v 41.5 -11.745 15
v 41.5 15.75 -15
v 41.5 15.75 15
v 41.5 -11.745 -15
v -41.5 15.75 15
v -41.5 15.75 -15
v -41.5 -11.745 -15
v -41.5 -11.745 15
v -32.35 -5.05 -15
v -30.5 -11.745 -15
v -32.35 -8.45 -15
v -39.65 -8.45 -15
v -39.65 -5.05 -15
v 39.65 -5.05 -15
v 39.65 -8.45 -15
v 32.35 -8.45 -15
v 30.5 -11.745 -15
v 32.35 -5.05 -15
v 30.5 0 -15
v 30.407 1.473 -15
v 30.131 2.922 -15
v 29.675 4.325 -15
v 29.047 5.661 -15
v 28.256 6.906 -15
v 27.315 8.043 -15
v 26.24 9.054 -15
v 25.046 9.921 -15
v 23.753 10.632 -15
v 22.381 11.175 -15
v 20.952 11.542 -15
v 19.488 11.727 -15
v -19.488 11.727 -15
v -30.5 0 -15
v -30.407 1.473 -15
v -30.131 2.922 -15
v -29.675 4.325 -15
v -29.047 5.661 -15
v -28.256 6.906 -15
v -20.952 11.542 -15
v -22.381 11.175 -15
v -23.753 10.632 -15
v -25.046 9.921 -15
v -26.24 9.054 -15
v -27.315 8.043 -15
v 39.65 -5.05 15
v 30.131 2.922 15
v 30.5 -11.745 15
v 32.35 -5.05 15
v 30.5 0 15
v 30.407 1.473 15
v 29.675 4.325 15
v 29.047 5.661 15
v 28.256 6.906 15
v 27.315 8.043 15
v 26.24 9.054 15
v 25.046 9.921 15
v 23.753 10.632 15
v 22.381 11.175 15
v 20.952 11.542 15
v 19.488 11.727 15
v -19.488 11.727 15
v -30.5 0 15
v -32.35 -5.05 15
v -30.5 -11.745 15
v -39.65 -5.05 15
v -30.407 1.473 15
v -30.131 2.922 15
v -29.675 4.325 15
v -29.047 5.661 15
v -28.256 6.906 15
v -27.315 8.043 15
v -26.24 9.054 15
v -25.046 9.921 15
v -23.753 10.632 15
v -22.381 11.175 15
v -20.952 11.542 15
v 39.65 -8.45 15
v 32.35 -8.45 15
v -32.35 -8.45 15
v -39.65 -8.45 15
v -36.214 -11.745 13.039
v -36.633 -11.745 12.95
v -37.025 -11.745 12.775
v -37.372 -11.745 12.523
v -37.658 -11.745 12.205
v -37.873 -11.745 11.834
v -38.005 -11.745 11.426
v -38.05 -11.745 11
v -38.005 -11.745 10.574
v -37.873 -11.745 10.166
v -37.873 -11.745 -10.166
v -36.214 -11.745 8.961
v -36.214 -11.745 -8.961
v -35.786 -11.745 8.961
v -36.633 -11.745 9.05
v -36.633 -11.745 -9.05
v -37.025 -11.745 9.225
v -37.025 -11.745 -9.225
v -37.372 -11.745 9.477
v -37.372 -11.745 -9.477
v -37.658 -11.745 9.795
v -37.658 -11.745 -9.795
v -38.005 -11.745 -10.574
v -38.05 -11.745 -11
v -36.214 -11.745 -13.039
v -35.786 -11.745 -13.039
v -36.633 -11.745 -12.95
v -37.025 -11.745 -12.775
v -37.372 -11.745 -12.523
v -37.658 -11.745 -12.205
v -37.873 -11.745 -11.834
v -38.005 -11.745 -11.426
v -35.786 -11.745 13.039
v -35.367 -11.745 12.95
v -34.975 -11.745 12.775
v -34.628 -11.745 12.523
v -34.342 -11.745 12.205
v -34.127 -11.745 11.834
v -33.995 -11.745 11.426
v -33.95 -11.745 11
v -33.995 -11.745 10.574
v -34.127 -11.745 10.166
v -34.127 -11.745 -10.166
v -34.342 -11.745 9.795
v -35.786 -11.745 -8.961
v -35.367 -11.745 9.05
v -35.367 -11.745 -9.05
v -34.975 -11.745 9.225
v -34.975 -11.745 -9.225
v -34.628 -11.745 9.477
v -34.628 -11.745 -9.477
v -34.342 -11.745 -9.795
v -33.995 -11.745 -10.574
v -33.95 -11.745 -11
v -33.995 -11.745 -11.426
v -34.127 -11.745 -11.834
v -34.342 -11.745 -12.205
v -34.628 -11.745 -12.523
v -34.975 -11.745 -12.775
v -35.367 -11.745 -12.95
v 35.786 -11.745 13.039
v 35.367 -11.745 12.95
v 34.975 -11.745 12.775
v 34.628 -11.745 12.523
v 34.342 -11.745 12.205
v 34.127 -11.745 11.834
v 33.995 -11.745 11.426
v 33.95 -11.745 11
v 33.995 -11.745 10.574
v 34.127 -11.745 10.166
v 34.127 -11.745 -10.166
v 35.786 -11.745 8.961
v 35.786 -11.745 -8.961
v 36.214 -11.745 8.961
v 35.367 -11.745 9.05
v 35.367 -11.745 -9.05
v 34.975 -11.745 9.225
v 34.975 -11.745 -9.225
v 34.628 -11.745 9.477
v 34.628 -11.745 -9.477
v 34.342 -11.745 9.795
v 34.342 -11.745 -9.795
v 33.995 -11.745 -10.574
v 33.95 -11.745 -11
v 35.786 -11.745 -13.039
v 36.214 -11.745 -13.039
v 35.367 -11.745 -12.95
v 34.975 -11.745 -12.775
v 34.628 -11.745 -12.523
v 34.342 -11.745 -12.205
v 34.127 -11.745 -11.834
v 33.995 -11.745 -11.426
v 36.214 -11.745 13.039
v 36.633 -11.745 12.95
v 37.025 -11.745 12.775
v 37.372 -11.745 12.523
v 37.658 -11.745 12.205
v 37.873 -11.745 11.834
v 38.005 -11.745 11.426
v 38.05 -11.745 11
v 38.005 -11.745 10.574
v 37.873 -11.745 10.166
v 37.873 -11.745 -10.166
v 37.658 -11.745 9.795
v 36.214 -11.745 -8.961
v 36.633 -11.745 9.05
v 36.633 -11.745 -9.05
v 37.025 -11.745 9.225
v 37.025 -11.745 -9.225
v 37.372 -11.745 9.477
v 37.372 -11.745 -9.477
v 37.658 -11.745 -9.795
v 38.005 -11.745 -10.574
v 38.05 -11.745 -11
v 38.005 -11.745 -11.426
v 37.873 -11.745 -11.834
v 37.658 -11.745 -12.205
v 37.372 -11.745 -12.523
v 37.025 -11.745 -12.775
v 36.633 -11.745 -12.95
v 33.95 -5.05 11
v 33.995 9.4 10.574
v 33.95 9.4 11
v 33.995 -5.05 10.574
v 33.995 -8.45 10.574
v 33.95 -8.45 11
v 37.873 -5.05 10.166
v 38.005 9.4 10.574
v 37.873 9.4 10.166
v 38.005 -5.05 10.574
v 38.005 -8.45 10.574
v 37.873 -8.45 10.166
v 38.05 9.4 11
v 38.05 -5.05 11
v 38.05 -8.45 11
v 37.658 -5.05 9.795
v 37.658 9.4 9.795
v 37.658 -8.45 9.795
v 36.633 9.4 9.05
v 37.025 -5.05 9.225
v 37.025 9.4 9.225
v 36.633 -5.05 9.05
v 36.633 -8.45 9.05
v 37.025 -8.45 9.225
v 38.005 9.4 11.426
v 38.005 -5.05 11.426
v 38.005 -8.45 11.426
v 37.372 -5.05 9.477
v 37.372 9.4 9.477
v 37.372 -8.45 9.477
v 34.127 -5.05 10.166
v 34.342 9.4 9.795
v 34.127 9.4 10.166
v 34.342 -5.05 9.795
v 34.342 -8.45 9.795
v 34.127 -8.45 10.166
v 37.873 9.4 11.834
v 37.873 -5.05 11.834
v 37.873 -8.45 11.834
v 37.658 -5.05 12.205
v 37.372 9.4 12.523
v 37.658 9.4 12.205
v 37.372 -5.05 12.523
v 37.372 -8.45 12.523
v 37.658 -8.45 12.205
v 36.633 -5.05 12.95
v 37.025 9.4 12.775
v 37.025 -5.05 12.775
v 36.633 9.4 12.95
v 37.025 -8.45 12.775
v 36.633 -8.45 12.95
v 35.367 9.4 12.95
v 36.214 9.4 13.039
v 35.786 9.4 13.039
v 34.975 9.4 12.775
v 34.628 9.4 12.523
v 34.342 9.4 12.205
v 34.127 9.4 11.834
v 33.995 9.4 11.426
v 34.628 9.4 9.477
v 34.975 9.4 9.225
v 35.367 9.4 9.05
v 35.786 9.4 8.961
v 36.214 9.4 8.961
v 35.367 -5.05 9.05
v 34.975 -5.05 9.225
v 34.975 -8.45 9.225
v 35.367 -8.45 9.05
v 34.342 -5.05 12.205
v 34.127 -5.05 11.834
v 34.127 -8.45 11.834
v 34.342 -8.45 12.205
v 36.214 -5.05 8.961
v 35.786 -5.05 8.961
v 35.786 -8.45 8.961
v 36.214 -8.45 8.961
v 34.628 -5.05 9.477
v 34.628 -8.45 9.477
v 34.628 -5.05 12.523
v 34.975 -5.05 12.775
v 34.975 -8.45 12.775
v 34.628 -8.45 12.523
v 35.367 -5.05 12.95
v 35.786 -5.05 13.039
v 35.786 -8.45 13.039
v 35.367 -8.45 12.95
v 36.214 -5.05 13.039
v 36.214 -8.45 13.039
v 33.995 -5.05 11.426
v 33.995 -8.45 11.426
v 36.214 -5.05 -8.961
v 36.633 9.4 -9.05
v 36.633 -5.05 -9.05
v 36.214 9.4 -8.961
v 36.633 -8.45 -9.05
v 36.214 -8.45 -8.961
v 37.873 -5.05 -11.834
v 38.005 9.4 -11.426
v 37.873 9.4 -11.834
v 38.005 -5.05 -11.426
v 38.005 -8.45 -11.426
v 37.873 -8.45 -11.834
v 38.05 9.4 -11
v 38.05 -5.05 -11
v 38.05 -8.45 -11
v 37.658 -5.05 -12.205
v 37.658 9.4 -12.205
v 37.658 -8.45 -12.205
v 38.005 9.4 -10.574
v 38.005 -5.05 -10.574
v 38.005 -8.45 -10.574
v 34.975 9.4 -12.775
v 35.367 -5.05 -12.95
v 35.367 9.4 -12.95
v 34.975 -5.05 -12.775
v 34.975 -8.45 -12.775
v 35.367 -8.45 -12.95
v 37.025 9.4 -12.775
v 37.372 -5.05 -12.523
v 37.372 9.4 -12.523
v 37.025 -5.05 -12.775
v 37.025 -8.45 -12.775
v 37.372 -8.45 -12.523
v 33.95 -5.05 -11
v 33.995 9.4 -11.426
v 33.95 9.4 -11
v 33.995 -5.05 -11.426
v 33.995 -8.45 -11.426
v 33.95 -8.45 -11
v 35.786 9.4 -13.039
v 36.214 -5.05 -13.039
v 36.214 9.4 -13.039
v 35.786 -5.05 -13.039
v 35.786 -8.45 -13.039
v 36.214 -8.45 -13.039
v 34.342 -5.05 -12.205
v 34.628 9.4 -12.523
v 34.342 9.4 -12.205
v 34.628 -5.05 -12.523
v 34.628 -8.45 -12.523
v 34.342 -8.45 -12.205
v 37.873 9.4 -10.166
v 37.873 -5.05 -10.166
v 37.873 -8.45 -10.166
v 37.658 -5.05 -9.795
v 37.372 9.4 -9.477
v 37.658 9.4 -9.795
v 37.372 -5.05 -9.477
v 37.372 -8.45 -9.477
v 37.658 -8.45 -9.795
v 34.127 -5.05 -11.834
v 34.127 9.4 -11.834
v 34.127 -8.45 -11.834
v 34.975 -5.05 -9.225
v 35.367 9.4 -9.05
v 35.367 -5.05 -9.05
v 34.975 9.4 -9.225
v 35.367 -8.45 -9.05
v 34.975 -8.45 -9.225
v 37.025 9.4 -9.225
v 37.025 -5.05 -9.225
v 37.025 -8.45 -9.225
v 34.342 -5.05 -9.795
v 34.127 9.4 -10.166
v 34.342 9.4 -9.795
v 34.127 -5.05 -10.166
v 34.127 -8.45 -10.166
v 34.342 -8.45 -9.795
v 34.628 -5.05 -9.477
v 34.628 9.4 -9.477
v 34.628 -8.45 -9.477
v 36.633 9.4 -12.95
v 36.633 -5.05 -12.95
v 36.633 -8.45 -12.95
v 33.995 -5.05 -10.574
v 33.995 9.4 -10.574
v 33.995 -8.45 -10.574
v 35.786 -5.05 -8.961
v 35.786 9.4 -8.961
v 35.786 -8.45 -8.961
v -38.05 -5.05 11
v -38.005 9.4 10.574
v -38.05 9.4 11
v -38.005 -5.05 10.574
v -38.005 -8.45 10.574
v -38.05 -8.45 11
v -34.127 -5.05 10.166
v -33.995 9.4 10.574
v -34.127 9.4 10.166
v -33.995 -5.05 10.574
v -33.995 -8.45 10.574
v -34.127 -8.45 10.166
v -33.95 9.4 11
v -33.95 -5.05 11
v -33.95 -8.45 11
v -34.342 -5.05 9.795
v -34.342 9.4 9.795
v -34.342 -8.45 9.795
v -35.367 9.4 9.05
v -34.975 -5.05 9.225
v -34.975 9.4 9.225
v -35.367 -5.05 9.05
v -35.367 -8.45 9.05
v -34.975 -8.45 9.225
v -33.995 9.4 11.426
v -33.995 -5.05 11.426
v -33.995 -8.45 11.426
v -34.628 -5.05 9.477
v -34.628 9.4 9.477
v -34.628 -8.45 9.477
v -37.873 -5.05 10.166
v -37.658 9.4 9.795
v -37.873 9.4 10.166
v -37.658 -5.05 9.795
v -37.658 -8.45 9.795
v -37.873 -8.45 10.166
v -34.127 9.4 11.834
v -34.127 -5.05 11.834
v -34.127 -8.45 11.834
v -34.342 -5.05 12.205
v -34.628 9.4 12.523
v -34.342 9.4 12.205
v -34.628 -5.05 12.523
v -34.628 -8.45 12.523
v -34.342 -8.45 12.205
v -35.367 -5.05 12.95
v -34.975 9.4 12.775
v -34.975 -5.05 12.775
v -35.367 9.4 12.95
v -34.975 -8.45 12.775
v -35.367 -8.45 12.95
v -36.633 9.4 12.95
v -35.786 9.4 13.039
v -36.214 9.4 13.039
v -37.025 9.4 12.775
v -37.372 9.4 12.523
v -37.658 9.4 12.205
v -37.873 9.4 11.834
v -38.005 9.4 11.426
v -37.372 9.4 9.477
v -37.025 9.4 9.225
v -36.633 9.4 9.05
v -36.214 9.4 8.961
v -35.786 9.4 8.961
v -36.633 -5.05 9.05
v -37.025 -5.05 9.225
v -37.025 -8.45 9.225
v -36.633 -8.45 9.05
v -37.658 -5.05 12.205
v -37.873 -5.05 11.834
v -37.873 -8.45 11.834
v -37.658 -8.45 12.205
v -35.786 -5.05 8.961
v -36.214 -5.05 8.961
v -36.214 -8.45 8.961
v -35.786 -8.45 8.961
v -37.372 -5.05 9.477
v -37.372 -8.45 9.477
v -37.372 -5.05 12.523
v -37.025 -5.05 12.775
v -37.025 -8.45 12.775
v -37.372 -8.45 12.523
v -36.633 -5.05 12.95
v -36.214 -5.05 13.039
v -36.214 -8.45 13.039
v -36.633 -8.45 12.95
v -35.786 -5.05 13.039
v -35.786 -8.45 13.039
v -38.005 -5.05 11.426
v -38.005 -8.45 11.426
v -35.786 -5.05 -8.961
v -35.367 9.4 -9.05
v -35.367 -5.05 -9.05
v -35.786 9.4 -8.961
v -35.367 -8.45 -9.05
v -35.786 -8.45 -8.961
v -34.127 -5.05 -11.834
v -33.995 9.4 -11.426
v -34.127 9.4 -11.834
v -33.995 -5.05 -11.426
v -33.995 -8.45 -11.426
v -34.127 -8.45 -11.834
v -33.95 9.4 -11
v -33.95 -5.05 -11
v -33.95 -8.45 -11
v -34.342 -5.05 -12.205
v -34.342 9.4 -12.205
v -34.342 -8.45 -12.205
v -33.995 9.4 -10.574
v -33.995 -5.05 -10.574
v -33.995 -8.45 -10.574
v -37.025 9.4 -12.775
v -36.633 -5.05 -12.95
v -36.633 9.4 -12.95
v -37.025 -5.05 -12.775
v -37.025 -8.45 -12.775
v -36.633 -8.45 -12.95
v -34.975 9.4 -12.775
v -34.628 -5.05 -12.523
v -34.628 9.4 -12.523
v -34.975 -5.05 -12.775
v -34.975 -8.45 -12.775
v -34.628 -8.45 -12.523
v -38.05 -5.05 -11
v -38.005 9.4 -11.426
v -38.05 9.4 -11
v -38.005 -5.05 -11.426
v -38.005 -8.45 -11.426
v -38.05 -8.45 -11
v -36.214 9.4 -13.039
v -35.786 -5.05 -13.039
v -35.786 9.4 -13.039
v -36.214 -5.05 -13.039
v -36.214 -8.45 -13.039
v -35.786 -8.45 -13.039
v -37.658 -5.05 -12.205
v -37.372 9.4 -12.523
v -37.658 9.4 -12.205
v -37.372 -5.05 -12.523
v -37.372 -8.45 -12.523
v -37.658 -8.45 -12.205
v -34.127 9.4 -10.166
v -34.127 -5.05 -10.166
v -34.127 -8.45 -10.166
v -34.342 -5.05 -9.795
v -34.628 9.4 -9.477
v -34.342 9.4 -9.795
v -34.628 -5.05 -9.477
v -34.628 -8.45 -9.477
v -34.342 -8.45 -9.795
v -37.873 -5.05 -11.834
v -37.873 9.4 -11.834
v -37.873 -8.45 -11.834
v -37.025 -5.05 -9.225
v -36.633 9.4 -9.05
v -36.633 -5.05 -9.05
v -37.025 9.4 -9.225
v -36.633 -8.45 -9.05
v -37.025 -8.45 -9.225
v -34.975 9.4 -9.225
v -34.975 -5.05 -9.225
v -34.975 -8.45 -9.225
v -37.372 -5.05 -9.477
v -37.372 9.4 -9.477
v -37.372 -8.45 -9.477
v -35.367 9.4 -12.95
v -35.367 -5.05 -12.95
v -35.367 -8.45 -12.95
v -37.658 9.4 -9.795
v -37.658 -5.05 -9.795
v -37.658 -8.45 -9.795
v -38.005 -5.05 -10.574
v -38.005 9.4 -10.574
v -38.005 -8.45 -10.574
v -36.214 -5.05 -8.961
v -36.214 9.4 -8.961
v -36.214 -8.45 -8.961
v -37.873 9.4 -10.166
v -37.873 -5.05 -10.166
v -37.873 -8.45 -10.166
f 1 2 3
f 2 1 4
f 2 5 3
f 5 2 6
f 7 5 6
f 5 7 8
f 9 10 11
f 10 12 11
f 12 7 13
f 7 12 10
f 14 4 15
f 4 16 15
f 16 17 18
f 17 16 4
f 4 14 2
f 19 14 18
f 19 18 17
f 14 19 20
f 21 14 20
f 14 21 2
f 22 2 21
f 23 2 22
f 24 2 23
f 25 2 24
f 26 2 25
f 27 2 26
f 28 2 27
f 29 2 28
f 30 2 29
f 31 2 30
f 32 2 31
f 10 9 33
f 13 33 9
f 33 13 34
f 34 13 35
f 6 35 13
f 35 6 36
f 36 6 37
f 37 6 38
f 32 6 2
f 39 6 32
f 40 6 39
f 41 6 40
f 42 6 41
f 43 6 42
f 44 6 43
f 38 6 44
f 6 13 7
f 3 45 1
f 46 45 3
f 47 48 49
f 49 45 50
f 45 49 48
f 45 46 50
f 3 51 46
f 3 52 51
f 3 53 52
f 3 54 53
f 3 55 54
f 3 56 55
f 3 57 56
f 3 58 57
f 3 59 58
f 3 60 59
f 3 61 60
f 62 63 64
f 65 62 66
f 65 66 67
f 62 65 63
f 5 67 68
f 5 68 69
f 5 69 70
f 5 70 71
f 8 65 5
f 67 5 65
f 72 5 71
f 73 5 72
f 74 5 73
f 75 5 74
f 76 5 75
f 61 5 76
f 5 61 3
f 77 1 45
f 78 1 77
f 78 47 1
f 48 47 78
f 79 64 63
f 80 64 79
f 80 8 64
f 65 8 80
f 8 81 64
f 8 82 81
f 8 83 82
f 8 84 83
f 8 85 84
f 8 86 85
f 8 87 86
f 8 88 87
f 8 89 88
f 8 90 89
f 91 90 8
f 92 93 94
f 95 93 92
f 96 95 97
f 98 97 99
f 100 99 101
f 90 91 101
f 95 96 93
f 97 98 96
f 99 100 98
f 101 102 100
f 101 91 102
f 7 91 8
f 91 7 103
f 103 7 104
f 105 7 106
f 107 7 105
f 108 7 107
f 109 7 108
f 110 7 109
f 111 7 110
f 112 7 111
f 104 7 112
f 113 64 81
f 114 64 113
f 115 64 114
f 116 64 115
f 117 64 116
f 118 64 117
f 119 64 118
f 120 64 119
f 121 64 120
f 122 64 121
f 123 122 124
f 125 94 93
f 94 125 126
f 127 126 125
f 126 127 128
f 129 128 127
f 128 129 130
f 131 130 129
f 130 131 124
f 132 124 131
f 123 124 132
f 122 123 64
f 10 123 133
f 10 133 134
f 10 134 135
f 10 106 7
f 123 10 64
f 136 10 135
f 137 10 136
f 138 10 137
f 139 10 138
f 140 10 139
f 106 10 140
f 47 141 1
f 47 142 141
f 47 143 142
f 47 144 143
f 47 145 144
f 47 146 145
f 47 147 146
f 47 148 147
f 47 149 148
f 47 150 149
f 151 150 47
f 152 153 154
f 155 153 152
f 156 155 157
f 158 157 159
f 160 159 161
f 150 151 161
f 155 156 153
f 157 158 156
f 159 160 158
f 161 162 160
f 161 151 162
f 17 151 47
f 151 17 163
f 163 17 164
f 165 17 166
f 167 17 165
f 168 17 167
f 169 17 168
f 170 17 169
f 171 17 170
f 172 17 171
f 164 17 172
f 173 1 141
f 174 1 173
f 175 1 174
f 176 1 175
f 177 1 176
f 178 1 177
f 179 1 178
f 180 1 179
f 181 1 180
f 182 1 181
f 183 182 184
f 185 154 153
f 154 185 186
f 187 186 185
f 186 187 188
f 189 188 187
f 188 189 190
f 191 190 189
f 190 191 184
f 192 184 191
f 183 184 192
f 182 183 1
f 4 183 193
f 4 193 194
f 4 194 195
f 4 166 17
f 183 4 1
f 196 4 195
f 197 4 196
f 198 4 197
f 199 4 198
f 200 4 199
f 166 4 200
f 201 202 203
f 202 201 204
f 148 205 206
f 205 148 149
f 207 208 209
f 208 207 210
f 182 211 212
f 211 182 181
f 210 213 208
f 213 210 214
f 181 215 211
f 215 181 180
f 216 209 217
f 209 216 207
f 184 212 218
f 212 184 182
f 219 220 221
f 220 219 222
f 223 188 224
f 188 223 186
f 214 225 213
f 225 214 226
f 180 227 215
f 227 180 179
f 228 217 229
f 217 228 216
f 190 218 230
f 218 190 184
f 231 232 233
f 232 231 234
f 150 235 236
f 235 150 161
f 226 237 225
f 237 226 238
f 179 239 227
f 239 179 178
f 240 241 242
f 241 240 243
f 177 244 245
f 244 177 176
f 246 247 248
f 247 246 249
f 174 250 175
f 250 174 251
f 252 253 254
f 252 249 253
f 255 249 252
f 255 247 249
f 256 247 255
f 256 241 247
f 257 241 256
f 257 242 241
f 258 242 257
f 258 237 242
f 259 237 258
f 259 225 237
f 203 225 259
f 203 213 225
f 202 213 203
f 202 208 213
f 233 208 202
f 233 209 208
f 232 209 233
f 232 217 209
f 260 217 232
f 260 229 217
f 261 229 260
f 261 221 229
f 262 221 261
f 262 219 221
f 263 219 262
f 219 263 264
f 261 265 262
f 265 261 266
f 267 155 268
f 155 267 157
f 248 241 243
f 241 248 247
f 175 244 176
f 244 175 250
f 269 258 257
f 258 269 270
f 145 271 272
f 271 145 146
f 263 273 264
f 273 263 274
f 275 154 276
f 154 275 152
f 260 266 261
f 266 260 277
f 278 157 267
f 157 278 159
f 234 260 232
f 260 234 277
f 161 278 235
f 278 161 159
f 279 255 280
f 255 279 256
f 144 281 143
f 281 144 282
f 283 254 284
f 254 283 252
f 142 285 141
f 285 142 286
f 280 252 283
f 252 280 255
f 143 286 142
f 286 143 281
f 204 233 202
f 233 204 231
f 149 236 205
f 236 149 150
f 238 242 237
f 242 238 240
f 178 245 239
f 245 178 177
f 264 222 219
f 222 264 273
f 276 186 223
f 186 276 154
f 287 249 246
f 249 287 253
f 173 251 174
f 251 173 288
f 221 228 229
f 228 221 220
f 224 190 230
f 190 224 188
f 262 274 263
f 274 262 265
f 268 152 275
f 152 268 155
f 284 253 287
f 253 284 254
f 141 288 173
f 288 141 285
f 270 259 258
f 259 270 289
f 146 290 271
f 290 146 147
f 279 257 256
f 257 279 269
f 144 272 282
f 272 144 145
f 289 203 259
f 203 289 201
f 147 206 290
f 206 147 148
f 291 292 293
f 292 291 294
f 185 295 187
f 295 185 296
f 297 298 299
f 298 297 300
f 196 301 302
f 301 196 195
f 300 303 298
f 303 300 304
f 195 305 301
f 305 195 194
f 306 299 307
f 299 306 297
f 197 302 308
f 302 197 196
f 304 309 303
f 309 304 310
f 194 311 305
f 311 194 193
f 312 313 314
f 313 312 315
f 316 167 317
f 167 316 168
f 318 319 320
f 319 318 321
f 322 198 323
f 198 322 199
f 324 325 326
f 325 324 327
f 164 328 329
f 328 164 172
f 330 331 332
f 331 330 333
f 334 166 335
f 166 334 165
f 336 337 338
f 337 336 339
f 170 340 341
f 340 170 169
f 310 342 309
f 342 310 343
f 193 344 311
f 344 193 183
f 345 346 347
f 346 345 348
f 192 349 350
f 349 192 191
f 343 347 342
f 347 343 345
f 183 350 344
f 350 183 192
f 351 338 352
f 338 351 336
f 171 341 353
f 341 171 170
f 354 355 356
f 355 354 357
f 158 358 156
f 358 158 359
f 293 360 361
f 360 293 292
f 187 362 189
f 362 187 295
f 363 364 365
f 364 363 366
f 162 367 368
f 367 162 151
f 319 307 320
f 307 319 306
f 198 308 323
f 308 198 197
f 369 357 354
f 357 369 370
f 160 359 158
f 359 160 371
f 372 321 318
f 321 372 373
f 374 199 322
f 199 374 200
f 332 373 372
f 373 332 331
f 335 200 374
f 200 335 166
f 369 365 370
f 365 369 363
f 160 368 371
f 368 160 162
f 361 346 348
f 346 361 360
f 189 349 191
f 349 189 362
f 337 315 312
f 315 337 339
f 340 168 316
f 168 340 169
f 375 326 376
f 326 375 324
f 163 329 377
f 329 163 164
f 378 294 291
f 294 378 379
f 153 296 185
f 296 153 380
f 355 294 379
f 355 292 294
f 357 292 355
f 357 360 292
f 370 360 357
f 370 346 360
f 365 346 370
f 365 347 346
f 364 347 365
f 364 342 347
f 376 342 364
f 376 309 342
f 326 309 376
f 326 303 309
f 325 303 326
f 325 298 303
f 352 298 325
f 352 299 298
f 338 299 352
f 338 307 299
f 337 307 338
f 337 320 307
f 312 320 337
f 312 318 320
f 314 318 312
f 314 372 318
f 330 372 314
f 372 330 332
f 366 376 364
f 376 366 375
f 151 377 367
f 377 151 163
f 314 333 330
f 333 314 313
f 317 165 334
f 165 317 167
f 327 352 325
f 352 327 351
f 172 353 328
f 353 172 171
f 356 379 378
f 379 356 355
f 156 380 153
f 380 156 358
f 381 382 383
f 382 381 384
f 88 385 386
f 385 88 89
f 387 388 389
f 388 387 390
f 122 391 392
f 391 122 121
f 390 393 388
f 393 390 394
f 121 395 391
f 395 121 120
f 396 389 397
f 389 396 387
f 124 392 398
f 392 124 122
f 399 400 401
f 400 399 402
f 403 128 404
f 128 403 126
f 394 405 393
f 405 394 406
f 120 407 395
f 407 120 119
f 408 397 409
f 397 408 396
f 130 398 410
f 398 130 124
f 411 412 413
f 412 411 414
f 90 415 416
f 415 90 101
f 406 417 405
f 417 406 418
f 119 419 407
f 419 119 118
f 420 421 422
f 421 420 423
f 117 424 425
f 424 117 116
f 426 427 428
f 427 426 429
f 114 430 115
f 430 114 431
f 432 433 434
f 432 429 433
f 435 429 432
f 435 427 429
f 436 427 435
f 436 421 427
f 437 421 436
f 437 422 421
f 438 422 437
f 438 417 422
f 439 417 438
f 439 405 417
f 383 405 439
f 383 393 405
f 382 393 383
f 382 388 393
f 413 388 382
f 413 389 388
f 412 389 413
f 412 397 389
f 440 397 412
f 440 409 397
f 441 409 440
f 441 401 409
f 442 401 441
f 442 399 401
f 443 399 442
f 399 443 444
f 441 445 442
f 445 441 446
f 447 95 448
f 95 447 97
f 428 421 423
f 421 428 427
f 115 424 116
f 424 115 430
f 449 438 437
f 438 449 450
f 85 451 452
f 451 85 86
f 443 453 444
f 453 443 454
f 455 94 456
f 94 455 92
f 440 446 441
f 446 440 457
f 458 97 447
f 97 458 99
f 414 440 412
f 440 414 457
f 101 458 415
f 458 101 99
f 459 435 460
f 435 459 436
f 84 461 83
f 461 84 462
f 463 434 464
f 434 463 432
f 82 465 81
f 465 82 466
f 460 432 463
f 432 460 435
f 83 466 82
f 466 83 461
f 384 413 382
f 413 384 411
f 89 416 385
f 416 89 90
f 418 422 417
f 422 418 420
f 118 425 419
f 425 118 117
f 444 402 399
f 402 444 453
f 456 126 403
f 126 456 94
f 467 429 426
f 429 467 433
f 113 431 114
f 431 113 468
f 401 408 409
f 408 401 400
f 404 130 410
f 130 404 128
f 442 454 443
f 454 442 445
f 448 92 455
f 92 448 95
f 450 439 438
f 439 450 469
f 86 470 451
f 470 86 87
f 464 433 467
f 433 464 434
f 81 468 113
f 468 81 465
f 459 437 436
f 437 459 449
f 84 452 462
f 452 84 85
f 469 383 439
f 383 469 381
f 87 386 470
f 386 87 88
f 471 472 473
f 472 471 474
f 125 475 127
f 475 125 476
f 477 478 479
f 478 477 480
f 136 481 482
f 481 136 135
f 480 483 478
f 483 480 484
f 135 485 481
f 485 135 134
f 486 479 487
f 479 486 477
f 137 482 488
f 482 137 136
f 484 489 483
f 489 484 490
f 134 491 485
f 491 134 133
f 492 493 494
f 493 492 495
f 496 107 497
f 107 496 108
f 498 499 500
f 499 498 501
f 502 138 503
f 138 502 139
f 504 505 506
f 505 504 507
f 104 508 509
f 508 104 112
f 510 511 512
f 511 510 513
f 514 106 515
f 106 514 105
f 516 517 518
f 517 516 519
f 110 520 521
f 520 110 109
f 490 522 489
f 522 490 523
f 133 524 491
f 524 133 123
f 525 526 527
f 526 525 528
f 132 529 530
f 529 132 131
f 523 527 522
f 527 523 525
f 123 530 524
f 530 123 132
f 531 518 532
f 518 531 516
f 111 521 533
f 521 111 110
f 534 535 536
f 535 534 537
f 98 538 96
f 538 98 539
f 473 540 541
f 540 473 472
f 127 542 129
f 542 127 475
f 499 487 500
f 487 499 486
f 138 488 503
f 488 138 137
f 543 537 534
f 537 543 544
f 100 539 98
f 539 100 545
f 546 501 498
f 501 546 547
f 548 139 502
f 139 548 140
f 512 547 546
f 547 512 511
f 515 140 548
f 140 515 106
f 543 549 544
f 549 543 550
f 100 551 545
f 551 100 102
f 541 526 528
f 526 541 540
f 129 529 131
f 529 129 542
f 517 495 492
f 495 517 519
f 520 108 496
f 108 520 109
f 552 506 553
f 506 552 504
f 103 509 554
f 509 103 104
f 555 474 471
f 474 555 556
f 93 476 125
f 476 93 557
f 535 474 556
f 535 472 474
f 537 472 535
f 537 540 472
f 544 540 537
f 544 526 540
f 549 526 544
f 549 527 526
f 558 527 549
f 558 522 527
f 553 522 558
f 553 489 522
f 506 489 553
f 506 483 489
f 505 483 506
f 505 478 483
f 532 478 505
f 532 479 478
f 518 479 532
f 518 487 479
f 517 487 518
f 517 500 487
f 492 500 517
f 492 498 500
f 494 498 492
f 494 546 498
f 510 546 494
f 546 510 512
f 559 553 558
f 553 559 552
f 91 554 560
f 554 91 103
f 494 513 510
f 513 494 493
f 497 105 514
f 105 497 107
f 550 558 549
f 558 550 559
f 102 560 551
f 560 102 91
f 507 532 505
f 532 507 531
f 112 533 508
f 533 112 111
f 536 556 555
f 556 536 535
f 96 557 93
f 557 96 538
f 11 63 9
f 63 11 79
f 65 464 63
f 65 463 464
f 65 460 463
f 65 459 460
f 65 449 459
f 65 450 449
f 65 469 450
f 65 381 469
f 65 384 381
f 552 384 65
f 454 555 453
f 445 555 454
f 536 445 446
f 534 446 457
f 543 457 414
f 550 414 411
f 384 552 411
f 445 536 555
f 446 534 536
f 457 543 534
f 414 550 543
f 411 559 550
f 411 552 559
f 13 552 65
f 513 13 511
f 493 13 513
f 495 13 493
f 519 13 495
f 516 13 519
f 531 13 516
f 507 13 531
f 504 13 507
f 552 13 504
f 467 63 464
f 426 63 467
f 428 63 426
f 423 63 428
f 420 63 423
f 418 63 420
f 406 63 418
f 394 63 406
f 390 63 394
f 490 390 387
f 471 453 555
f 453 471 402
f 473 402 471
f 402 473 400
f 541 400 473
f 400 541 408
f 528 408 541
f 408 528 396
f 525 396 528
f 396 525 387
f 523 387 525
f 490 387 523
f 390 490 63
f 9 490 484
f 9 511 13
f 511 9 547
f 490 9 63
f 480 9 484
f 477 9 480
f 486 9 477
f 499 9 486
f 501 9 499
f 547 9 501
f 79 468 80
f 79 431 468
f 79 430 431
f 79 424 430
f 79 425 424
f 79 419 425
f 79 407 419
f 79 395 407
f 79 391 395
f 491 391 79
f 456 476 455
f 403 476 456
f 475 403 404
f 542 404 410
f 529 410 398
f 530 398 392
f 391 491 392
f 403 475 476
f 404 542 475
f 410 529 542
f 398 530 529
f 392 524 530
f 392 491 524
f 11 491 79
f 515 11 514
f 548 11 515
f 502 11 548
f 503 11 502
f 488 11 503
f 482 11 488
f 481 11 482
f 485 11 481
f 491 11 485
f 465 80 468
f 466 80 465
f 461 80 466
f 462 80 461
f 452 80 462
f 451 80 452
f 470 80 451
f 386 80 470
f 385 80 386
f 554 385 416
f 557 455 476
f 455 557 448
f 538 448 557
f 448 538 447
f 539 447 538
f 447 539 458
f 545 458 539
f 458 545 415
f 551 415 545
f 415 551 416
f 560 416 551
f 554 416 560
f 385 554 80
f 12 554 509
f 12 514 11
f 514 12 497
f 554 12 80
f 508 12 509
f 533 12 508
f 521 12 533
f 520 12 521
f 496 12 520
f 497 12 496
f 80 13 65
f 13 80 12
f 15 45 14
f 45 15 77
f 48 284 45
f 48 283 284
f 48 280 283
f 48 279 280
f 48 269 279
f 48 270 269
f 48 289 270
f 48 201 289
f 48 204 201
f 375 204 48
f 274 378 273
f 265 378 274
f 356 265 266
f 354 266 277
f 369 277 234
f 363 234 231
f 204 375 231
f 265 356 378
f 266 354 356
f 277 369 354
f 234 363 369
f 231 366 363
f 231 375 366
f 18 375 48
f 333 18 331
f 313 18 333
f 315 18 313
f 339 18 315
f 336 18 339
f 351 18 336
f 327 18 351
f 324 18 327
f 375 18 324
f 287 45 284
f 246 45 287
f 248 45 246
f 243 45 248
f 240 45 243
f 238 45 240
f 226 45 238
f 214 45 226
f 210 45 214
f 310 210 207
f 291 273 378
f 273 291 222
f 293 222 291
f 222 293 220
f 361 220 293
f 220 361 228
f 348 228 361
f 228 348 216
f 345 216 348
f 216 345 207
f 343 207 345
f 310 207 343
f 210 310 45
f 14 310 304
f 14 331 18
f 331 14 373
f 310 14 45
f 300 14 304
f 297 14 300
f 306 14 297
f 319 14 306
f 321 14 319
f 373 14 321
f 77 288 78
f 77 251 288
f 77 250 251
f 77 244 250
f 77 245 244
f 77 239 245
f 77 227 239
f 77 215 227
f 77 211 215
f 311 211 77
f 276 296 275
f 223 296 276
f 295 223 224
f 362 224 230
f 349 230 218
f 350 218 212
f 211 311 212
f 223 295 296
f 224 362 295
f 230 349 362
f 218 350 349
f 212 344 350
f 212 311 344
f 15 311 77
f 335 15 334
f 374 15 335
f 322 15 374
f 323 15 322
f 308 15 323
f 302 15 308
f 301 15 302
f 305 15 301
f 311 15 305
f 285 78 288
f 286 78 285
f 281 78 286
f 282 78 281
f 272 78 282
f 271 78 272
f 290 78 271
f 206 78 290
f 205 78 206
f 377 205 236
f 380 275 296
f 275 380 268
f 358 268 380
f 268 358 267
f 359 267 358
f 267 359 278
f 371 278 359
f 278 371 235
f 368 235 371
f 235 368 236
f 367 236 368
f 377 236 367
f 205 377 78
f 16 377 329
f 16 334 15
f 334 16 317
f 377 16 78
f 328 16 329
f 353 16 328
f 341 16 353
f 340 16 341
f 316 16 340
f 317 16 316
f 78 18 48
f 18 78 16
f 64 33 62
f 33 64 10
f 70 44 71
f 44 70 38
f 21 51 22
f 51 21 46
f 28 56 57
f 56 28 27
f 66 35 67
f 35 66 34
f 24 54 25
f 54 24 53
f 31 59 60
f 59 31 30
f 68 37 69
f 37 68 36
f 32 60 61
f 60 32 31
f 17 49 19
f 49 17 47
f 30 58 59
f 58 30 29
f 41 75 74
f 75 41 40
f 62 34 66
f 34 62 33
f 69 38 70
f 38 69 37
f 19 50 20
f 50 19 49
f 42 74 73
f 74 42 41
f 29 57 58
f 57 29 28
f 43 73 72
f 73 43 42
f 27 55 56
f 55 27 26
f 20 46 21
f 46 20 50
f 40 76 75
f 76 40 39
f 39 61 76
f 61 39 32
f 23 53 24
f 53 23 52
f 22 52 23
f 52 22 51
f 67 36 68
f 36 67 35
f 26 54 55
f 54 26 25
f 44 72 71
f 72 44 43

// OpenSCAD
// file: module-avio.scad
module avio(width, height) {
    rotate([-90, 0, 0])
    translate([0, 0, -50])
    hull() {
        translate([-(width-height)/2, 0, 0])
            cylinder(100, d=height, $fn=50);
        translate([+(width-height)/2, 0, 0])
            cylinder(100, d=height, $fn=50);
        translate([-width/2, 0, 0])
            cube([width, height/2, 100]);
    }
}
// main file
width=61;
height=23.5;
nuthole=7.3;
nutheight=3.4;


use <module-avio.scad>;


module clamp() {
    difference() {
        cube([width+22, 30, height+8], center=true);

        // bottom
        translate([0, 0, -height])
            cube([2*width, 2*100, height+0.01], center=true);
        // holes
        $fn=30;
        translate([width/2+11/2, -11, -height])
            cylinder(1.4*height, d=4.1);
        translate([width/2+11/2, +11, -height])
            cylinder(1.4*height, d=4.1);
        translate([-width/2-11/2, -11, -height])
            cylinder(1.4*height, d=4.1);
        translate([-width/2-11/2, +11, -height])
            cylinder(1.4*height, d=4.1);
        // nut hole
        translate([-(width+11)/2, 0, -height/2+5])
            cube([nuthole, 60, nutheight], center=true);
        translate([+(width+11)/2, 0, -height/2+5])
            cube([nuthole, 60, nutheight], center=true);

        avio(width, height);
    }
}

rotate([-90,0,0])
    clamp();
